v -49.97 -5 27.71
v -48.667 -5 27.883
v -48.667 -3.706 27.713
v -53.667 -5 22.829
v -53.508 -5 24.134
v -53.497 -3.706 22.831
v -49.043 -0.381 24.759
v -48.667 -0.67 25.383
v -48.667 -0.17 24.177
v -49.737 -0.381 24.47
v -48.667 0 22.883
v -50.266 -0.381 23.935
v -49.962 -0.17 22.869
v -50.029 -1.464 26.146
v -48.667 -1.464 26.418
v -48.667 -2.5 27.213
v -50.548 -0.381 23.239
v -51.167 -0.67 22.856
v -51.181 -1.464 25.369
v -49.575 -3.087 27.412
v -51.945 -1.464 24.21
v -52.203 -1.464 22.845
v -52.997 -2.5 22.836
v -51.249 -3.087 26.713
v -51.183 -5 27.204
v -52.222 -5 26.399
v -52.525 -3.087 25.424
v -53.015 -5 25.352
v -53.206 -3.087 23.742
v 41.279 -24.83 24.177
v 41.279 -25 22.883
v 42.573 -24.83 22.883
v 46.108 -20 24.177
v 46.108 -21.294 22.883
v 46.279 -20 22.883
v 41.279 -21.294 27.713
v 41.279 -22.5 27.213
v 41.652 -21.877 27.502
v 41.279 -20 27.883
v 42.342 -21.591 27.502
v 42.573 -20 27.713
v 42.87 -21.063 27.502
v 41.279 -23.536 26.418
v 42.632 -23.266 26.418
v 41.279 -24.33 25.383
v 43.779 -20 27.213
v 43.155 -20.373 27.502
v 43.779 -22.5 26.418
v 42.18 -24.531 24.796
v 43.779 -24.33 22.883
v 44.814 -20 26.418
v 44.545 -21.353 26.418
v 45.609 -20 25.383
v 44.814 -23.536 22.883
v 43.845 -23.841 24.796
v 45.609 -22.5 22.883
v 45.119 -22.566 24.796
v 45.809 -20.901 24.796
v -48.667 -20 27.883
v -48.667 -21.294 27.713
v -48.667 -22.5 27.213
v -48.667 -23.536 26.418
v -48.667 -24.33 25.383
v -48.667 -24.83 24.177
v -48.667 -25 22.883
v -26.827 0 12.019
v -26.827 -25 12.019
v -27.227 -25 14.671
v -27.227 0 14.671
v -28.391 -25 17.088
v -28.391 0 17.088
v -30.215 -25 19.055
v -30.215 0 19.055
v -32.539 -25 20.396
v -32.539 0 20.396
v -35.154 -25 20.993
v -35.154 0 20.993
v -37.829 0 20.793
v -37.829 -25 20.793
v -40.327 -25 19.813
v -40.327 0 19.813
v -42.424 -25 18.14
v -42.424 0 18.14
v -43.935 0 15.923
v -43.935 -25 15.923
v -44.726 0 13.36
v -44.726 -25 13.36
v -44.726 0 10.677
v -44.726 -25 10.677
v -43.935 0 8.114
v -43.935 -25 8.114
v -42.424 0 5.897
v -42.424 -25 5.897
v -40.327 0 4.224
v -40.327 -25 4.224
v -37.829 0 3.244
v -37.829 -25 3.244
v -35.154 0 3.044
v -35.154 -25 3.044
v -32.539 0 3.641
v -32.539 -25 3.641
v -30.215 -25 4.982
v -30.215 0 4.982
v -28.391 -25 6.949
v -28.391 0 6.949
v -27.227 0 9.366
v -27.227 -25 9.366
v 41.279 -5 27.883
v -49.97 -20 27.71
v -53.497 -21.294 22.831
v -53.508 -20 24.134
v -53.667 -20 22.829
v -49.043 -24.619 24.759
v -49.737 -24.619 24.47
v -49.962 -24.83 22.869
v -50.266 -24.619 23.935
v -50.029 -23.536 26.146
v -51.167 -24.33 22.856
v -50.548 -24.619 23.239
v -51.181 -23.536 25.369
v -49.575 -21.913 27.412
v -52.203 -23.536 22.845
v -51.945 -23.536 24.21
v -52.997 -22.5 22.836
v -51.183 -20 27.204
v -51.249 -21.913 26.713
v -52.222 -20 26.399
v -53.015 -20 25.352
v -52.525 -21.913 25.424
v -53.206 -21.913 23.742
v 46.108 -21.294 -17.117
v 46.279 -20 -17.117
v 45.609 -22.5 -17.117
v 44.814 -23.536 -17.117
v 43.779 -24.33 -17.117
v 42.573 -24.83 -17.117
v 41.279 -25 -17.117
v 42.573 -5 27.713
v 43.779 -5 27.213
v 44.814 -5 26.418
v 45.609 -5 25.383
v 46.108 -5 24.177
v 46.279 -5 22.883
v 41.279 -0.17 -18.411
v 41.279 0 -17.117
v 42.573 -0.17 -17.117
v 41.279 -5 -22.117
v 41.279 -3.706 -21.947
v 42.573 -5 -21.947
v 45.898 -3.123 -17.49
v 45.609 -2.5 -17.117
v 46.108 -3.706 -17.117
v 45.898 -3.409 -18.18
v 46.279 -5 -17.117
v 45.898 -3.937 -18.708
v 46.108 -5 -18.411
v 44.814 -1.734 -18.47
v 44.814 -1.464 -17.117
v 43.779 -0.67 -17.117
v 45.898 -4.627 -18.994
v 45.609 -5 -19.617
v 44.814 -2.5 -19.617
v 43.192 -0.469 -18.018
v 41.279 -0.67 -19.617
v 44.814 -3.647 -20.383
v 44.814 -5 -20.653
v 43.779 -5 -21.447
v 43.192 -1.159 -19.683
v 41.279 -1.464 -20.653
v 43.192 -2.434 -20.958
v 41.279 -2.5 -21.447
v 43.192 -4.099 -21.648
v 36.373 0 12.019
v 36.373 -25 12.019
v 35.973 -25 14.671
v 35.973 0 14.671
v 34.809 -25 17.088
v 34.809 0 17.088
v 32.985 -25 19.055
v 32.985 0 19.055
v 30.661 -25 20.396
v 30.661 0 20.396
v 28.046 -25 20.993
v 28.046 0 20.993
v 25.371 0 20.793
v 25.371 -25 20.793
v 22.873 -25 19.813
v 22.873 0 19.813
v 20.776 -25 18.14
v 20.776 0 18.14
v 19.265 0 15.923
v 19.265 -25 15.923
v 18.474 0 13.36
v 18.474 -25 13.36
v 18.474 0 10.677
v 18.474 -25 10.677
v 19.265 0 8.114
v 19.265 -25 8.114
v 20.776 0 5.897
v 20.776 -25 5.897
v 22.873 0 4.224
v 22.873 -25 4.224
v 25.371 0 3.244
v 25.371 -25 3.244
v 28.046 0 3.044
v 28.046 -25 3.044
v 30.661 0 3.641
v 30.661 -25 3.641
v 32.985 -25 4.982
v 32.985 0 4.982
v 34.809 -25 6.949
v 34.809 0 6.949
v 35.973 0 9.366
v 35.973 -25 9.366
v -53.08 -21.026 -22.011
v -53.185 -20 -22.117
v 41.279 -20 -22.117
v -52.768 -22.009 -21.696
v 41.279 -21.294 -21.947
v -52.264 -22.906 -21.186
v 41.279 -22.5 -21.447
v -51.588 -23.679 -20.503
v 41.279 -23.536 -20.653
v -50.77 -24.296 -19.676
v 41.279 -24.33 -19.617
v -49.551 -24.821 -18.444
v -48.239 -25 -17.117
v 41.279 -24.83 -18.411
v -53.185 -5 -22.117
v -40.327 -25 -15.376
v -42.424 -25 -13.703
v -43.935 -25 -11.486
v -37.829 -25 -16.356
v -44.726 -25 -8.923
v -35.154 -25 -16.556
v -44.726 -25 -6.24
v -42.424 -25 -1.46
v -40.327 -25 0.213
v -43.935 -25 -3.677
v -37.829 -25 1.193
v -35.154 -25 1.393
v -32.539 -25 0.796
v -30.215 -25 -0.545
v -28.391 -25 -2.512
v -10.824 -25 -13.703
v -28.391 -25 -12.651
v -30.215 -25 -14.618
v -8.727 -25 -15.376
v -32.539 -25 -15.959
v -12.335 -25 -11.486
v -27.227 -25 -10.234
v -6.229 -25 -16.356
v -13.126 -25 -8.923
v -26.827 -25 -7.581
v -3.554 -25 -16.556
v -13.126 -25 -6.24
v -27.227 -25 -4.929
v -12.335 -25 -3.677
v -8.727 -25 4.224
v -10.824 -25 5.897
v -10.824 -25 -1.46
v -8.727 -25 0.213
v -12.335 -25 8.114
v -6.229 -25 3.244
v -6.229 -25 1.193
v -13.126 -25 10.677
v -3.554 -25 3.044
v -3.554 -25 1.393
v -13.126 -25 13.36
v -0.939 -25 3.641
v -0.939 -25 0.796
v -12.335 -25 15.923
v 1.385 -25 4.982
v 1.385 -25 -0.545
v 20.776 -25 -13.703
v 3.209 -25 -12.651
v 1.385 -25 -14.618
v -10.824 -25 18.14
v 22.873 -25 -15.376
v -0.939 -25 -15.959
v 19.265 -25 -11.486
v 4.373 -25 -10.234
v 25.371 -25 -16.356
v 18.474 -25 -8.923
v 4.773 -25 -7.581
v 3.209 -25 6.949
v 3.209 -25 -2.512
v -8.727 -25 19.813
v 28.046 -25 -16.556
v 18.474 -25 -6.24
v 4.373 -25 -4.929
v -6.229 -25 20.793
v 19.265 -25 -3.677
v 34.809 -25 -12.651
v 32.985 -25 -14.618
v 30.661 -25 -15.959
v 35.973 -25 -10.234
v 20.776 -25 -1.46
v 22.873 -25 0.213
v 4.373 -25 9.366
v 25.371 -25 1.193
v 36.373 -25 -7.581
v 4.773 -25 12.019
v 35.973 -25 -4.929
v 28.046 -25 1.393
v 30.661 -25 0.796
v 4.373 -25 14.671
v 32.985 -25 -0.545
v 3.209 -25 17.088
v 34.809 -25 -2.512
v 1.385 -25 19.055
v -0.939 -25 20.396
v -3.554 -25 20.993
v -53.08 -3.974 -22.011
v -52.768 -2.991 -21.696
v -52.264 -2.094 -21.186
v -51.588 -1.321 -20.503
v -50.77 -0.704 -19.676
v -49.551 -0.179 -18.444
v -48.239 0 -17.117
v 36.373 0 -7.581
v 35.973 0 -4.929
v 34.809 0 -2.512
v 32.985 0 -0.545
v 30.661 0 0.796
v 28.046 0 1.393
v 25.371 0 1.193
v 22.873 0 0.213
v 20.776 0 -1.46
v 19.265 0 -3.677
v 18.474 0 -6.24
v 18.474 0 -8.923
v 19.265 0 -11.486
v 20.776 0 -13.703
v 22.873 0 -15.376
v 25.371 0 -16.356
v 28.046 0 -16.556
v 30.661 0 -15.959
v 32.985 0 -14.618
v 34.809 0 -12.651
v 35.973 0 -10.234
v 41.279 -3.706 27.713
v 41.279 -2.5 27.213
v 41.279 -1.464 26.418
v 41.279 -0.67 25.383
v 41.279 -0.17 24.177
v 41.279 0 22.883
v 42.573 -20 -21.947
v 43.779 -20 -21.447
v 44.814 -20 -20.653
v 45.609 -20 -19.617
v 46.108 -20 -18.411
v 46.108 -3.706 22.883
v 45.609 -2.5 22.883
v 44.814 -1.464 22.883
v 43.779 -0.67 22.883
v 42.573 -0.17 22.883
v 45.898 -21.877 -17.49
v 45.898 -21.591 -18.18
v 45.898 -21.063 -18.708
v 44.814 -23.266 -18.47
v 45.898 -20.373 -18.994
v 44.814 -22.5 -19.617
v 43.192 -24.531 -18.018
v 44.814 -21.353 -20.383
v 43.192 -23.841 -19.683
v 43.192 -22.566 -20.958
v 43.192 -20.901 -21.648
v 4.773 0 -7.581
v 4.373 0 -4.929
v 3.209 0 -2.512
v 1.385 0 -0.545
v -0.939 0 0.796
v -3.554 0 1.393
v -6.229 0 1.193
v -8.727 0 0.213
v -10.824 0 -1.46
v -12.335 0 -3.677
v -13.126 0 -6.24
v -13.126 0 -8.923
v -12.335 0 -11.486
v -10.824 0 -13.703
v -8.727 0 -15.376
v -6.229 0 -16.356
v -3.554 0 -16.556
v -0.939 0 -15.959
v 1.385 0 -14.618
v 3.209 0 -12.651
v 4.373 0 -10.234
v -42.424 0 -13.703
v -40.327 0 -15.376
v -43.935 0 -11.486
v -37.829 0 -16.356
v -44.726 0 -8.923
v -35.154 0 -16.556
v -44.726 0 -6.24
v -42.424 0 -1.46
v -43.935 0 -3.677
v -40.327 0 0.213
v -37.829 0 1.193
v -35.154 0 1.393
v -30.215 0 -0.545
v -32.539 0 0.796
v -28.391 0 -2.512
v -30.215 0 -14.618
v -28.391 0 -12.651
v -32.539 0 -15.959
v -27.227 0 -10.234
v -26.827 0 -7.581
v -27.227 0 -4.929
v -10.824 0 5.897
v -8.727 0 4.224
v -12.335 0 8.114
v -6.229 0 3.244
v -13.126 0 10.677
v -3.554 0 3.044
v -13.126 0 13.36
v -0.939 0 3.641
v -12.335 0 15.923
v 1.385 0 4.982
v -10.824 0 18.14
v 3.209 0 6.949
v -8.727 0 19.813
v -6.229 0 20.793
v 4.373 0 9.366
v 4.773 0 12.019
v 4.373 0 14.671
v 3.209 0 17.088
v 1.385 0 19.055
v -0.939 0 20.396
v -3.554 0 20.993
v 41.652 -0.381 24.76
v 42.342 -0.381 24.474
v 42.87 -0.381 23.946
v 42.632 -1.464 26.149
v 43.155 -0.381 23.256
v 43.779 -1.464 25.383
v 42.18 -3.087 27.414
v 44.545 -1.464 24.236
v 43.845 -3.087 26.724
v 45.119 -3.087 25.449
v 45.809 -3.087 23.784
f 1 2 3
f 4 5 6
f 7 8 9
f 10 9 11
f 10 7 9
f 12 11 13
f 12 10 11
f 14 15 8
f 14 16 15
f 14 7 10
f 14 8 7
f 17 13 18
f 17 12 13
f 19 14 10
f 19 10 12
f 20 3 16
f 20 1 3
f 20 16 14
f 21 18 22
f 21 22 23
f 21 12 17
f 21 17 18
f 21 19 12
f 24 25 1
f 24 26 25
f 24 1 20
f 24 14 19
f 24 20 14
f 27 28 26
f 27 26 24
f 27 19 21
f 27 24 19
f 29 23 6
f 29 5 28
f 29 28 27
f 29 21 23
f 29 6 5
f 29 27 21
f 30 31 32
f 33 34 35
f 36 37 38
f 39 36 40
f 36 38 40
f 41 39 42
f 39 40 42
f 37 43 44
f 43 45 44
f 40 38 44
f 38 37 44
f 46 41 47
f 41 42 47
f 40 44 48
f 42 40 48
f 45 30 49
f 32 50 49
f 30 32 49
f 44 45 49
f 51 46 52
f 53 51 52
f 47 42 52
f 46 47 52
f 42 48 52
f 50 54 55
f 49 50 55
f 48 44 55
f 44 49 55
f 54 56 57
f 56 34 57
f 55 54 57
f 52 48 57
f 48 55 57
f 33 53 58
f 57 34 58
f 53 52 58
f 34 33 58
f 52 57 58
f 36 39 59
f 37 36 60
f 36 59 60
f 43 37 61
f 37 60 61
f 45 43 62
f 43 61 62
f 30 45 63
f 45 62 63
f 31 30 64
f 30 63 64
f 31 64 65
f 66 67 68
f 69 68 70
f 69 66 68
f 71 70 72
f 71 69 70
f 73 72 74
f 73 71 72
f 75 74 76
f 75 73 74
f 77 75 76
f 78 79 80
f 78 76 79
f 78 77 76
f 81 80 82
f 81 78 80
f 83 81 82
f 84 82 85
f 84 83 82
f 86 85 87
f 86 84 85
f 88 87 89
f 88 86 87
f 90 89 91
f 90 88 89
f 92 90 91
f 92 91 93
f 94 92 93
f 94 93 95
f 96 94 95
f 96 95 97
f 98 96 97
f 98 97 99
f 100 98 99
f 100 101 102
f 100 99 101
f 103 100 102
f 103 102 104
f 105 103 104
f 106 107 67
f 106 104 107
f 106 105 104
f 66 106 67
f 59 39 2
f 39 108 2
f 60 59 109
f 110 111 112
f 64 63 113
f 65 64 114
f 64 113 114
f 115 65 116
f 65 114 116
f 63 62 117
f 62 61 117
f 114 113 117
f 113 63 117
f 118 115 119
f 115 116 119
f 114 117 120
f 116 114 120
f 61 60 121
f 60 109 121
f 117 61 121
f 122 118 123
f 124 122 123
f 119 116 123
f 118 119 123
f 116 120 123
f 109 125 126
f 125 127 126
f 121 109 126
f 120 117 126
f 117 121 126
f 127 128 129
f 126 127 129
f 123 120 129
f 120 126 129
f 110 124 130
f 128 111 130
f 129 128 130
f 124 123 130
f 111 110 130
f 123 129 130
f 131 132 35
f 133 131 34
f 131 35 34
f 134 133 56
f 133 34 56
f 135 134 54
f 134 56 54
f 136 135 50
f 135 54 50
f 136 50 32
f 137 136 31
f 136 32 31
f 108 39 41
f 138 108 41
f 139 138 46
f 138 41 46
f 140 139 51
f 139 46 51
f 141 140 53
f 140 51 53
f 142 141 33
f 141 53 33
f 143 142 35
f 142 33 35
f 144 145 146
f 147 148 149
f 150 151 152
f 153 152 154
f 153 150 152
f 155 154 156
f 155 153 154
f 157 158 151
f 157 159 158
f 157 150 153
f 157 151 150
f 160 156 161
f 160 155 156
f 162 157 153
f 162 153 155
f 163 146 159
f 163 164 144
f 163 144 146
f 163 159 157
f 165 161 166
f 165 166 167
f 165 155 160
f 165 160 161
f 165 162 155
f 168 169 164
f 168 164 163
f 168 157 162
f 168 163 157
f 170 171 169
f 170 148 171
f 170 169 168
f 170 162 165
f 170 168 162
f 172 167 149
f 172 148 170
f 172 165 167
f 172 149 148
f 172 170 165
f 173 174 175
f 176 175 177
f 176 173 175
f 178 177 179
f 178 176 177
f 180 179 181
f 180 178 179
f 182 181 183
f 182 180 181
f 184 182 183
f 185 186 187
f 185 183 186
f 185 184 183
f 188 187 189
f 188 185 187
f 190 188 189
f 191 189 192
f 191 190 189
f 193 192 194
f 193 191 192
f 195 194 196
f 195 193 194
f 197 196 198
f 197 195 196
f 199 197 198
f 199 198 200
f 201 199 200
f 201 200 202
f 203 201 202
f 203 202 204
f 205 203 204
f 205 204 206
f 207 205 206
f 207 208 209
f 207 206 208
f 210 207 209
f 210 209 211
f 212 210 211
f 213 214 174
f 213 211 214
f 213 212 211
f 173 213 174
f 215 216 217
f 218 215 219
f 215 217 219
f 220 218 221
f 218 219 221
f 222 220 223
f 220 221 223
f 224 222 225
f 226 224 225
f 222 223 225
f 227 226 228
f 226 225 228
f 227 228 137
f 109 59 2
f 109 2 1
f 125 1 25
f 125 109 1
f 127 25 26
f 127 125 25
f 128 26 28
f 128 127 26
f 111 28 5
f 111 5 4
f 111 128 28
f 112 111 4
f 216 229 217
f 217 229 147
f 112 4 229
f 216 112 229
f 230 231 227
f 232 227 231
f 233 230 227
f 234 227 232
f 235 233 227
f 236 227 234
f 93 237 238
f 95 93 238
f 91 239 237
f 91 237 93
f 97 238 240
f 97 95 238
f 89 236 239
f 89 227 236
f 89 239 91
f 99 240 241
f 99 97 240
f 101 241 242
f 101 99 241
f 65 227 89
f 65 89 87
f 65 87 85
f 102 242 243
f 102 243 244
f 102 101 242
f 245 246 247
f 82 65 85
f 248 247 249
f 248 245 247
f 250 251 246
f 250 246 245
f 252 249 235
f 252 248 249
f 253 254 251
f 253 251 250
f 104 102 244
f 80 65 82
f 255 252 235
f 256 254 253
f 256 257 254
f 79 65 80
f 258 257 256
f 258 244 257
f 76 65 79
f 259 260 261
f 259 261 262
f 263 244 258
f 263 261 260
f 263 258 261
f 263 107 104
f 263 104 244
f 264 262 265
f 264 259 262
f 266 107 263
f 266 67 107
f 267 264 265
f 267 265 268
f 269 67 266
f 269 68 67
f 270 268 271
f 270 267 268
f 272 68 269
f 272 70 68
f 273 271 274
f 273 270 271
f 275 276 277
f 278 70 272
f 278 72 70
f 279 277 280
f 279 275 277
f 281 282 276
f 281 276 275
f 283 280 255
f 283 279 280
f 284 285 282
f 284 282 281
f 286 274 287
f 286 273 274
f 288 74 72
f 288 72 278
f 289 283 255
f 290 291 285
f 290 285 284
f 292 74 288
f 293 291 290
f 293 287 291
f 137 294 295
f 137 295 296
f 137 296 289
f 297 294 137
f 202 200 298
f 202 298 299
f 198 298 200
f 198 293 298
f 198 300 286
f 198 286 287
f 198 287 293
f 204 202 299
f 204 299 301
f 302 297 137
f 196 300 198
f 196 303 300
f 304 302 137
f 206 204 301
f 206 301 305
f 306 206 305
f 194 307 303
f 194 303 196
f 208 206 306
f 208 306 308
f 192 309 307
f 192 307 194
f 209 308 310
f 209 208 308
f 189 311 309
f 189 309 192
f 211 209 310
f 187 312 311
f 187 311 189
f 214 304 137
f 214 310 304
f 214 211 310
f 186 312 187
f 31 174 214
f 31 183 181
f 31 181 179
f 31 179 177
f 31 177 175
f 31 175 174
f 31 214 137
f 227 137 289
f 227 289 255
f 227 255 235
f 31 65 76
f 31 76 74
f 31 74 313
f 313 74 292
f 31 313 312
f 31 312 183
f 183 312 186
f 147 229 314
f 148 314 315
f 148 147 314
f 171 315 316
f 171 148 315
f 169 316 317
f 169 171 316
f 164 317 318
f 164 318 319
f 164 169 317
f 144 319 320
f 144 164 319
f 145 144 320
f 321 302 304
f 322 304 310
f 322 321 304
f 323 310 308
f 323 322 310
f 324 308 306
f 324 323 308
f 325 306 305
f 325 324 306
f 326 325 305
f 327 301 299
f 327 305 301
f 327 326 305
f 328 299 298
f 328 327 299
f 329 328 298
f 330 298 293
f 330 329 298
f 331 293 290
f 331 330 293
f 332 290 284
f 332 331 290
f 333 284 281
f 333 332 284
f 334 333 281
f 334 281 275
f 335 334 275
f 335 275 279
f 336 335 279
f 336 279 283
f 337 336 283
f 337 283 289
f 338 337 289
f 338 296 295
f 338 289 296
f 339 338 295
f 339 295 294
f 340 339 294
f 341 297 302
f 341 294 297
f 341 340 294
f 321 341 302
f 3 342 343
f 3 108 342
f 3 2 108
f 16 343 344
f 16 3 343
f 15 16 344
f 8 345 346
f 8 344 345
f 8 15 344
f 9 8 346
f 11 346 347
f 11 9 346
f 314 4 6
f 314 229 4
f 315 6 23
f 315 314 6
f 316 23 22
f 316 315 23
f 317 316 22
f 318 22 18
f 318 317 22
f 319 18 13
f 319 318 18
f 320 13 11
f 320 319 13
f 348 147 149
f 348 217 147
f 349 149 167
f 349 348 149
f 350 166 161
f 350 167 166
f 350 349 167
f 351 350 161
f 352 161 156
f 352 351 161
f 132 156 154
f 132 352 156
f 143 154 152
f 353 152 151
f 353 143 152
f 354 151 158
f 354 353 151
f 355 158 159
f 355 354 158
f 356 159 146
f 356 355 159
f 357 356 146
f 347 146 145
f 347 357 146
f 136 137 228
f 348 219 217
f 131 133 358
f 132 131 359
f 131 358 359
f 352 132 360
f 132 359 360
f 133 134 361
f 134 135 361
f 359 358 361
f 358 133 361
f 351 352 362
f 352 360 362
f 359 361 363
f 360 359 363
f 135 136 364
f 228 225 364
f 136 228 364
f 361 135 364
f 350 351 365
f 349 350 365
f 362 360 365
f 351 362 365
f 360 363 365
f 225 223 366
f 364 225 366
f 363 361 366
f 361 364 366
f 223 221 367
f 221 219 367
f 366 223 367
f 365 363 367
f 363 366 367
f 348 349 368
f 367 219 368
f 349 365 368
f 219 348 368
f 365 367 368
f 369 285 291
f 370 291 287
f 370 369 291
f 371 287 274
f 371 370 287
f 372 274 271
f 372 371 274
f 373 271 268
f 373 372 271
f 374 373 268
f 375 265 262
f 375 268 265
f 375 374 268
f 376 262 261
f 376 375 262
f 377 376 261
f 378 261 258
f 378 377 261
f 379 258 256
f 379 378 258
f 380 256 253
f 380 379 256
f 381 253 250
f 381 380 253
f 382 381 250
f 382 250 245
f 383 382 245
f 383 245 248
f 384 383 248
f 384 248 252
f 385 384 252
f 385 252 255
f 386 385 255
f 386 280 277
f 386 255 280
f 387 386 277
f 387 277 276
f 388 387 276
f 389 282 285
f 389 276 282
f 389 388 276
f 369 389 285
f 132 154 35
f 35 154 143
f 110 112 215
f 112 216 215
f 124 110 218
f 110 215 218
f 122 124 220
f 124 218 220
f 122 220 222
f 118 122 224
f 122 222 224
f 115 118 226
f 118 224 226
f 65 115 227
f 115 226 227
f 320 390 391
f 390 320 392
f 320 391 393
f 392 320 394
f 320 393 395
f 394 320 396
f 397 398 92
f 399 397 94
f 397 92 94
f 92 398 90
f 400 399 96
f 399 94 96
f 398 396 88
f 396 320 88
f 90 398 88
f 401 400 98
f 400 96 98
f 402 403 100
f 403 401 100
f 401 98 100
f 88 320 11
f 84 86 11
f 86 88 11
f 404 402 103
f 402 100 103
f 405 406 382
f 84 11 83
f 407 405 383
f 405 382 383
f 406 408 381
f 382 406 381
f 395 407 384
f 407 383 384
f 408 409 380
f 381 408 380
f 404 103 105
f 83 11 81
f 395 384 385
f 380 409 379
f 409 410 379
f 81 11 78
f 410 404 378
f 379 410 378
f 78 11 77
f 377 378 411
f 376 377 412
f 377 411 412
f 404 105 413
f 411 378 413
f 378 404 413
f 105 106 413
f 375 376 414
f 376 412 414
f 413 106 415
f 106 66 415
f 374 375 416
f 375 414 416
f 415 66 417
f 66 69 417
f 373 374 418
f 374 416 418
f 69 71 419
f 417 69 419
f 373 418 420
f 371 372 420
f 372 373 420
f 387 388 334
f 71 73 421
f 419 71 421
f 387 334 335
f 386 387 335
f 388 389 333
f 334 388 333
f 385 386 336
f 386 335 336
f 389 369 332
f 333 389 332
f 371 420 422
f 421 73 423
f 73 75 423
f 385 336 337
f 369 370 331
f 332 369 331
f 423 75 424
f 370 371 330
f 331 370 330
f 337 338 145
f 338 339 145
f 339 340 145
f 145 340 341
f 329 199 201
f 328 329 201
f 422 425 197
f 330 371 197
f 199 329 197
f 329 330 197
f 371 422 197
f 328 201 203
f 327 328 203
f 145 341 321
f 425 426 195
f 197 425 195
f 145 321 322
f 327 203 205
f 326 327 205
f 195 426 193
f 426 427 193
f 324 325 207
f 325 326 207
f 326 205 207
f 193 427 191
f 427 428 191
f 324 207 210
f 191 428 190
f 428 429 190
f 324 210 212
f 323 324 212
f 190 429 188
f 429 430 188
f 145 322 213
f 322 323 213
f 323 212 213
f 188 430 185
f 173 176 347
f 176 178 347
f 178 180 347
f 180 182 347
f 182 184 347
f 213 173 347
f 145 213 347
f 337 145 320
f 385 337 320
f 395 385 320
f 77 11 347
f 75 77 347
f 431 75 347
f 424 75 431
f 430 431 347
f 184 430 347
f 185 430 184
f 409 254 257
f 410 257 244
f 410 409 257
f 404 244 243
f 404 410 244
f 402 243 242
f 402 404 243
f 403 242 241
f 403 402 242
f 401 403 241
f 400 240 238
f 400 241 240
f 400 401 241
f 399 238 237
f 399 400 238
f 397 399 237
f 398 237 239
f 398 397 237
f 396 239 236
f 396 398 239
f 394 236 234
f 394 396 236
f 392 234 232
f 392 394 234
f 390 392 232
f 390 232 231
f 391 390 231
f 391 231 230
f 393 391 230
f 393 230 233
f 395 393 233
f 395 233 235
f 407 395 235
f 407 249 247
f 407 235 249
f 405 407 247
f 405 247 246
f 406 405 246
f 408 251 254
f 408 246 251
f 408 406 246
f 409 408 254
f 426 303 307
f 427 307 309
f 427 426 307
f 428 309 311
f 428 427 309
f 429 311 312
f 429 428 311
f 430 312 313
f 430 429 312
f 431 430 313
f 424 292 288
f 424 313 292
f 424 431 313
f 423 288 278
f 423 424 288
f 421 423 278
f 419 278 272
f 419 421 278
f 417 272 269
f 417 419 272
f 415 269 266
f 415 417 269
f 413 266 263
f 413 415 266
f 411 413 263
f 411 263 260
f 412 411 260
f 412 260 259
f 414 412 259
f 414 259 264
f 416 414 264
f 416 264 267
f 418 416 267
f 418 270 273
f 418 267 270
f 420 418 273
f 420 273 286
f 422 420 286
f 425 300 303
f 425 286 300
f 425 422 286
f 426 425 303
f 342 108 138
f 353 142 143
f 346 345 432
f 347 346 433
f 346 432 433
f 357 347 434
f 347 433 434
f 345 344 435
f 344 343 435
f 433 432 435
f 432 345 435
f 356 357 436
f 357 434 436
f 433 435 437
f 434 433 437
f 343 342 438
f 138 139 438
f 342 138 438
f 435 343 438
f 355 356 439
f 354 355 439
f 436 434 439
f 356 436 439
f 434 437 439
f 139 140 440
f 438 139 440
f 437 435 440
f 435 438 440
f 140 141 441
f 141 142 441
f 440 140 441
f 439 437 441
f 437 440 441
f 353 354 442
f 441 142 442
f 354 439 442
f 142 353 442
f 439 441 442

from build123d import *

# Parameters (mm, degrees)
F1_DEPTH = 25
F2_R     = 5
F3_R     = 9
F4_DEPTH = 25.001


with BuildPart() as f1:
    # F0 (on Front) → F1 (new body)
    with BuildSketch(Plane.XZ):
        Polygon((46.278606, 27.882919), (-53.721394, 27.882919), (-53.185202, -22.117081), (46.278606, -22.117081), align=None)
    extrude(amount=F1_DEPTH)

    # F2
    f2_edges = [f1.edges().sort_by_distance(p)[0] for p in [
        (-3.453298, 0, -22.117081),
        (-3.453298, -25, -22.117081),
        (46.278606, -25, 2.882919),
        (-3.721394, -25, 27.882919),
        (-53.453298, -25, 2.882919),
        (46.278606, -12.5, 27.882919),
        (-53.721394, -12.5, 27.882919),
        (-3.721394, 0, 27.882919),
        (46.278606, 0, 2.882919),
        (-53.453298, 0, 2.882919),
        (46.278606, -12.5, -22.117081),
    ]]
    fillet(f2_edges, radius=F2_R)

    # F3 (on Front) → F4 (cut, through all)
    with BuildSketch(Plane.XZ):
        with Locations((-35.826672, 12.018532)):
            Circle(F3_R)
        with Locations((-35.826672, -7.581468)):
            Circle(F3_R)
        with Locations((-4.226672, 12.018532)):
            Circle(F3_R)
        with Locations((-4.226672, -7.581468)):
            Circle(F3_R)
        with Locations((27.373328, 12.018532)):
            Circle(F3_R)
        with Locations((27.373328, -7.581468)):
            Circle(F3_R)
    extrude(amount=F4_DEPTH, mode=Mode.SUBTRACT)


solid = f1.part
